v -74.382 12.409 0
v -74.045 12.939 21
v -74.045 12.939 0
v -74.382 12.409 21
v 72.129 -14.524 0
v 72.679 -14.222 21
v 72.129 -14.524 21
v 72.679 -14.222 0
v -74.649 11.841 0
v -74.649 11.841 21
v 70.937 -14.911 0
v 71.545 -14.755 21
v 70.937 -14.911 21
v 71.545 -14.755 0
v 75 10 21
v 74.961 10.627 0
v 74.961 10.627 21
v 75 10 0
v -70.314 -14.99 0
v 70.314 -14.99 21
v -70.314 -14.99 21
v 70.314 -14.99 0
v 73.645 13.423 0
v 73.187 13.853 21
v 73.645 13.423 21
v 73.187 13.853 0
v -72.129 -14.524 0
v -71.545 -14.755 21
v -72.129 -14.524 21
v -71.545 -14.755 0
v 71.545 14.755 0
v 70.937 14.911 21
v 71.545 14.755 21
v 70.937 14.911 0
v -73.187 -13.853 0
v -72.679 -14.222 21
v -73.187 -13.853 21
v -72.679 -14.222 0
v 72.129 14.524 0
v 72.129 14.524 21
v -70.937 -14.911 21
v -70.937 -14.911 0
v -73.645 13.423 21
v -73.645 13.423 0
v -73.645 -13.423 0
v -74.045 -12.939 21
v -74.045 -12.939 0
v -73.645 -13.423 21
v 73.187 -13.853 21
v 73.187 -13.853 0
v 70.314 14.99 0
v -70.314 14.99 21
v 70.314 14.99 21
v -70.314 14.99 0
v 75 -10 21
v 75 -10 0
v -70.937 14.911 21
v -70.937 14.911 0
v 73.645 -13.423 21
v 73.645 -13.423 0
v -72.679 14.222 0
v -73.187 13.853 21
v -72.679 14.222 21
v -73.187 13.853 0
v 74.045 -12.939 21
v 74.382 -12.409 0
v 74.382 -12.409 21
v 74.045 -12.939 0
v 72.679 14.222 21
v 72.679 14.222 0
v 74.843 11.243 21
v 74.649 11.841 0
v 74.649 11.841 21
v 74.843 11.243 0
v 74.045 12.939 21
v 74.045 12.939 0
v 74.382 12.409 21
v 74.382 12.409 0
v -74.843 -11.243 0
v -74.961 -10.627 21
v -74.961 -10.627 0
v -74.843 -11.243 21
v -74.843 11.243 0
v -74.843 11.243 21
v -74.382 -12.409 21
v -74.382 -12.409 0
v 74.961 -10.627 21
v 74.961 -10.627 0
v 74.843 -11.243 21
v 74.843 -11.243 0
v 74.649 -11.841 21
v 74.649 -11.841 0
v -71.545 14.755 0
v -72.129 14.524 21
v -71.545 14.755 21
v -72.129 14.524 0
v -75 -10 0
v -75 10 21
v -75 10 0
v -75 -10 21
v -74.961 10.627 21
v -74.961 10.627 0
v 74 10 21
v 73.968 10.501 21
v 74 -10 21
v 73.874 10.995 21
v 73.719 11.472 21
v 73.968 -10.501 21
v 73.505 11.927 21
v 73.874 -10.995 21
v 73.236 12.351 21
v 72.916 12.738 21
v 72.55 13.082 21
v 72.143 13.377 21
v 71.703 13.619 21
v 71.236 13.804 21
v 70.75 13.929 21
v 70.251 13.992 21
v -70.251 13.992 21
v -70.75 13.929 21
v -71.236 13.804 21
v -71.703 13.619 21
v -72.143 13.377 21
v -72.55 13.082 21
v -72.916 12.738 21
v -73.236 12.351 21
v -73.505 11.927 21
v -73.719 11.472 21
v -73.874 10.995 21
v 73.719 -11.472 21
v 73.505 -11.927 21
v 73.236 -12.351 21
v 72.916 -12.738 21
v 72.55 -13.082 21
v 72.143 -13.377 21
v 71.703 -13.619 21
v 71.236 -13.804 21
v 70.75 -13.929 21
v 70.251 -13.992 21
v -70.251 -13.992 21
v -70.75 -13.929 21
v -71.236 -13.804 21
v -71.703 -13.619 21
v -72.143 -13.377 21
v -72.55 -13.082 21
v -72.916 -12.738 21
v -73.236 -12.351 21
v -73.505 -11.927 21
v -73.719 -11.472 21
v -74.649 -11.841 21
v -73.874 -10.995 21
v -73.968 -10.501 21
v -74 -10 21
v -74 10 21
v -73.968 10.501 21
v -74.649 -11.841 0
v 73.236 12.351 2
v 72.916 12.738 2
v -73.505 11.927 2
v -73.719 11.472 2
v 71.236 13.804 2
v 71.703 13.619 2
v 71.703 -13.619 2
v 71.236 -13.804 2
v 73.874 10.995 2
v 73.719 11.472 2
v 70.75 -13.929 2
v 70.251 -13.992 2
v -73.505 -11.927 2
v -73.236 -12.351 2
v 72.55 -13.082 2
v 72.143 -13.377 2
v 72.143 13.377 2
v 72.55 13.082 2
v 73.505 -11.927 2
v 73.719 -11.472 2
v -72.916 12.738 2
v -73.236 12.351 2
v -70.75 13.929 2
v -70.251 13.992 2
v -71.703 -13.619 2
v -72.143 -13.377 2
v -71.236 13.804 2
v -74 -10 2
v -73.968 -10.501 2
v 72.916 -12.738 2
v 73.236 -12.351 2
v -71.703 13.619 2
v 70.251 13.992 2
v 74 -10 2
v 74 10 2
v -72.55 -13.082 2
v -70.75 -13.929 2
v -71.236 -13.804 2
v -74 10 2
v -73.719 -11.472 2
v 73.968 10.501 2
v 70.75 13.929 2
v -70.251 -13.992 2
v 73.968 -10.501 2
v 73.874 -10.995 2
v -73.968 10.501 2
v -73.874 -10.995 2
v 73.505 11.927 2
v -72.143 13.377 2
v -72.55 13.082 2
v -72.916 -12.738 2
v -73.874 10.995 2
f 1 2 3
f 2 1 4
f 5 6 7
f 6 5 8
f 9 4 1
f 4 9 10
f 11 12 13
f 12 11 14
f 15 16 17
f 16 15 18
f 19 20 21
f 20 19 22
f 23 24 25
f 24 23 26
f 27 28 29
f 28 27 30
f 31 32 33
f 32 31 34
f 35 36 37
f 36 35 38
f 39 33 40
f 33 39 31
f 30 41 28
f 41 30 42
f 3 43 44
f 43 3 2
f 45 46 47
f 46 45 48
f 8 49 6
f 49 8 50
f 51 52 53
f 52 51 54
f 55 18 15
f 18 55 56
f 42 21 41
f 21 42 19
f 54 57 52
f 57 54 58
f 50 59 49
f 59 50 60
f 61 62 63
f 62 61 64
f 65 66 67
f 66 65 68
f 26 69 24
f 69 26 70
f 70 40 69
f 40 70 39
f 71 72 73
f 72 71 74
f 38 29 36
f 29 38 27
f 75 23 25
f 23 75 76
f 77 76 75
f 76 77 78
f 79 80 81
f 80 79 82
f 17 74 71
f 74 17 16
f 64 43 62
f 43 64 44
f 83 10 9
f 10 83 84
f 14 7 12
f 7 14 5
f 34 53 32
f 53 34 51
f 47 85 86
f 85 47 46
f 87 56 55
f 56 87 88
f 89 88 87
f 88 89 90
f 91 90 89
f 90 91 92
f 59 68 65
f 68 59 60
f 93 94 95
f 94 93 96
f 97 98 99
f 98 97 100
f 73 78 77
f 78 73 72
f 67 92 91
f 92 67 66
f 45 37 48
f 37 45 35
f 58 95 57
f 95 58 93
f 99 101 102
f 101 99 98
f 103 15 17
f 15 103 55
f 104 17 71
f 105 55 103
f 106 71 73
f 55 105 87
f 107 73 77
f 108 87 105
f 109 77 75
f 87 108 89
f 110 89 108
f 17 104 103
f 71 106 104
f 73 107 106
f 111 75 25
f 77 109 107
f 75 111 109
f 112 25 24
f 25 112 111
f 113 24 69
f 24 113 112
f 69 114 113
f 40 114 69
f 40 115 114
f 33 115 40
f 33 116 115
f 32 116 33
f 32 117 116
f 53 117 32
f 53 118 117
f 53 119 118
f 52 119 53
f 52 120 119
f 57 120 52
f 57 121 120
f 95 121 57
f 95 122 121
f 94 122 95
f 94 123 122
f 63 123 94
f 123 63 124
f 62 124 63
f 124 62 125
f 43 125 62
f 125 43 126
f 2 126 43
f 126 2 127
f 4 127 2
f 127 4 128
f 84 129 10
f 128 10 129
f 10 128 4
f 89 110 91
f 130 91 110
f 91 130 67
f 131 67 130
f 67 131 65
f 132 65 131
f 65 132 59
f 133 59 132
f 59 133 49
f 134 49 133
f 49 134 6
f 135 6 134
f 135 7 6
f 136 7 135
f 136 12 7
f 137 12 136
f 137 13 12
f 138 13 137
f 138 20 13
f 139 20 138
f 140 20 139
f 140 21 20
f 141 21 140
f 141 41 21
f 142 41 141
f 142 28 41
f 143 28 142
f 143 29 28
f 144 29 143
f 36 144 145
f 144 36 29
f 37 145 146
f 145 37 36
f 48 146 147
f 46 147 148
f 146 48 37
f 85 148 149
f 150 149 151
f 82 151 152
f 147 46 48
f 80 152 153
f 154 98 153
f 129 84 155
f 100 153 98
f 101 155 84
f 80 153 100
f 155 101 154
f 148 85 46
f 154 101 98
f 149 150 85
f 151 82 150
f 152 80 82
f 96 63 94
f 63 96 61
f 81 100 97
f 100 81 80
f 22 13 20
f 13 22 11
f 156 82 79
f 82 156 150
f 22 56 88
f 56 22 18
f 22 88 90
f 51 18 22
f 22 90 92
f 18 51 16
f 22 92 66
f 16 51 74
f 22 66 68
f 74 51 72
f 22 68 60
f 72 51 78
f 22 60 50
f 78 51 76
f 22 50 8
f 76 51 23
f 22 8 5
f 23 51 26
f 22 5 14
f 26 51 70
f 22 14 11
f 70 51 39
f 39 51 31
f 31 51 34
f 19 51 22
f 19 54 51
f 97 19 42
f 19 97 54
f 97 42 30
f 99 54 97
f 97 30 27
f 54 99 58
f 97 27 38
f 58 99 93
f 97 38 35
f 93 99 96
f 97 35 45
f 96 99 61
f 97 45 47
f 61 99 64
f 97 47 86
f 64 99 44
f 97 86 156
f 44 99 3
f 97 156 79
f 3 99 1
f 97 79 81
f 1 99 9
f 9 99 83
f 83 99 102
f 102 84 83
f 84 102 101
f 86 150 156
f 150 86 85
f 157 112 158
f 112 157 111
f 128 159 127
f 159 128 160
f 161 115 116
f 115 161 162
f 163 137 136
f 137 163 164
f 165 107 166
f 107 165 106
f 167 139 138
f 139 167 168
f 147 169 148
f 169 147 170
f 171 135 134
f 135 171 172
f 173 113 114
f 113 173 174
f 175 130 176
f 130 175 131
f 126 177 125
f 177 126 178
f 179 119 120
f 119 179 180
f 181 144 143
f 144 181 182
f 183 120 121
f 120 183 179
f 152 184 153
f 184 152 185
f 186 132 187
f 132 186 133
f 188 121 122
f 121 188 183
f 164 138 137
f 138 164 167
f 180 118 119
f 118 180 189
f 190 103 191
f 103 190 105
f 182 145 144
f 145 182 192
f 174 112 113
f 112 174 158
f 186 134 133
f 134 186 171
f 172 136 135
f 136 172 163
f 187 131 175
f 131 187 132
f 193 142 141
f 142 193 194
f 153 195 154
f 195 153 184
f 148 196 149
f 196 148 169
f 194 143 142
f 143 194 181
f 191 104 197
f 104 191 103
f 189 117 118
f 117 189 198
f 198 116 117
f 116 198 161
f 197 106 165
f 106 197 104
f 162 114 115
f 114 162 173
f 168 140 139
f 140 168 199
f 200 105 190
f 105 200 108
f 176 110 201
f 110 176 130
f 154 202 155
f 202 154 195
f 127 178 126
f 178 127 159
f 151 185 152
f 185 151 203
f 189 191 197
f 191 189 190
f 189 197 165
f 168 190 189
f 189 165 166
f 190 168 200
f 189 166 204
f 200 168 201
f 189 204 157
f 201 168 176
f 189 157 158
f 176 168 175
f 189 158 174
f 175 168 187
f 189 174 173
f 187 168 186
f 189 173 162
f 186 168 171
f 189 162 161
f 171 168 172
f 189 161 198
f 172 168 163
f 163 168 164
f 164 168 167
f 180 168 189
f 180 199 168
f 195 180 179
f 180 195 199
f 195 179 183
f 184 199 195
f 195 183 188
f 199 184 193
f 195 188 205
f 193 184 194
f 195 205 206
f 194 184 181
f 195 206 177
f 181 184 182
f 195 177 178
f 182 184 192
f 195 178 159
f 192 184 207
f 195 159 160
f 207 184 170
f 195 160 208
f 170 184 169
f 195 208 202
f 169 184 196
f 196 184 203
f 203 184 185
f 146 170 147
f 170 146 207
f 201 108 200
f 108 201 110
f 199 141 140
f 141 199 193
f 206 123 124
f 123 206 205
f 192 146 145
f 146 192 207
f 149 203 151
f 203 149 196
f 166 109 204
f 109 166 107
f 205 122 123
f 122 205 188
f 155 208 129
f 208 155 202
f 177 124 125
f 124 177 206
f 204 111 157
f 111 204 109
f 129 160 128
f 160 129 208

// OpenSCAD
$fn = 50;


difference() {
	union() {
		hull() {
			translate(v = [-70.0000000000, 10.0000000000, 0]) {
				cylinder(h = 21, r = 5);
			}
			translate(v = [70.0000000000, 10.0000000000, 0]) {
				cylinder(h = 21, r = 5);
			}
			translate(v = [-70.0000000000, -10.0000000000, 0]) {
				cylinder(h = 21, r = 5);
			}
			translate(v = [70.0000000000, -10.0000000000, 0]) {
				cylinder(h = 21, r = 5);
			}
		}
	}
	union() {
		translate(v = [0, 0, 2]) {
			hull() {
				translate(v = [-70.0000000000, 10.0000000000, 0]) {
					cylinder(h = 19, r = 4);
				}
				translate(v = [70.0000000000, 10.0000000000, 0]) {
					cylinder(h = 19, r = 4);
				}
				translate(v = [-70.0000000000, -10.0000000000, 0]) {
					cylinder(h = 19, r = 4);
				}
				translate(v = [70.0000000000, -10.0000000000, 0]) {
					cylinder(h = 19, r = 4);
				}
			}
		}
	}
}
